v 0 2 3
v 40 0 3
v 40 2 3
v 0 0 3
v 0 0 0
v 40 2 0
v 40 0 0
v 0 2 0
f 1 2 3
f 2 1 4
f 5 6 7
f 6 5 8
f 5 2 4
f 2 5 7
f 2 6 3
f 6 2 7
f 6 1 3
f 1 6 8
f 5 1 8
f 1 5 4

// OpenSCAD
/* [Dimensions] */
// Width in millimeters
width=40; // [10:5:100]
/* [Appearance] */
shape="round"; // ["round":"Round", "square":"Square"]
/* [Hidden] */
internalOffset=0.01;
module model() { cube([width,2,3]); }
model();
